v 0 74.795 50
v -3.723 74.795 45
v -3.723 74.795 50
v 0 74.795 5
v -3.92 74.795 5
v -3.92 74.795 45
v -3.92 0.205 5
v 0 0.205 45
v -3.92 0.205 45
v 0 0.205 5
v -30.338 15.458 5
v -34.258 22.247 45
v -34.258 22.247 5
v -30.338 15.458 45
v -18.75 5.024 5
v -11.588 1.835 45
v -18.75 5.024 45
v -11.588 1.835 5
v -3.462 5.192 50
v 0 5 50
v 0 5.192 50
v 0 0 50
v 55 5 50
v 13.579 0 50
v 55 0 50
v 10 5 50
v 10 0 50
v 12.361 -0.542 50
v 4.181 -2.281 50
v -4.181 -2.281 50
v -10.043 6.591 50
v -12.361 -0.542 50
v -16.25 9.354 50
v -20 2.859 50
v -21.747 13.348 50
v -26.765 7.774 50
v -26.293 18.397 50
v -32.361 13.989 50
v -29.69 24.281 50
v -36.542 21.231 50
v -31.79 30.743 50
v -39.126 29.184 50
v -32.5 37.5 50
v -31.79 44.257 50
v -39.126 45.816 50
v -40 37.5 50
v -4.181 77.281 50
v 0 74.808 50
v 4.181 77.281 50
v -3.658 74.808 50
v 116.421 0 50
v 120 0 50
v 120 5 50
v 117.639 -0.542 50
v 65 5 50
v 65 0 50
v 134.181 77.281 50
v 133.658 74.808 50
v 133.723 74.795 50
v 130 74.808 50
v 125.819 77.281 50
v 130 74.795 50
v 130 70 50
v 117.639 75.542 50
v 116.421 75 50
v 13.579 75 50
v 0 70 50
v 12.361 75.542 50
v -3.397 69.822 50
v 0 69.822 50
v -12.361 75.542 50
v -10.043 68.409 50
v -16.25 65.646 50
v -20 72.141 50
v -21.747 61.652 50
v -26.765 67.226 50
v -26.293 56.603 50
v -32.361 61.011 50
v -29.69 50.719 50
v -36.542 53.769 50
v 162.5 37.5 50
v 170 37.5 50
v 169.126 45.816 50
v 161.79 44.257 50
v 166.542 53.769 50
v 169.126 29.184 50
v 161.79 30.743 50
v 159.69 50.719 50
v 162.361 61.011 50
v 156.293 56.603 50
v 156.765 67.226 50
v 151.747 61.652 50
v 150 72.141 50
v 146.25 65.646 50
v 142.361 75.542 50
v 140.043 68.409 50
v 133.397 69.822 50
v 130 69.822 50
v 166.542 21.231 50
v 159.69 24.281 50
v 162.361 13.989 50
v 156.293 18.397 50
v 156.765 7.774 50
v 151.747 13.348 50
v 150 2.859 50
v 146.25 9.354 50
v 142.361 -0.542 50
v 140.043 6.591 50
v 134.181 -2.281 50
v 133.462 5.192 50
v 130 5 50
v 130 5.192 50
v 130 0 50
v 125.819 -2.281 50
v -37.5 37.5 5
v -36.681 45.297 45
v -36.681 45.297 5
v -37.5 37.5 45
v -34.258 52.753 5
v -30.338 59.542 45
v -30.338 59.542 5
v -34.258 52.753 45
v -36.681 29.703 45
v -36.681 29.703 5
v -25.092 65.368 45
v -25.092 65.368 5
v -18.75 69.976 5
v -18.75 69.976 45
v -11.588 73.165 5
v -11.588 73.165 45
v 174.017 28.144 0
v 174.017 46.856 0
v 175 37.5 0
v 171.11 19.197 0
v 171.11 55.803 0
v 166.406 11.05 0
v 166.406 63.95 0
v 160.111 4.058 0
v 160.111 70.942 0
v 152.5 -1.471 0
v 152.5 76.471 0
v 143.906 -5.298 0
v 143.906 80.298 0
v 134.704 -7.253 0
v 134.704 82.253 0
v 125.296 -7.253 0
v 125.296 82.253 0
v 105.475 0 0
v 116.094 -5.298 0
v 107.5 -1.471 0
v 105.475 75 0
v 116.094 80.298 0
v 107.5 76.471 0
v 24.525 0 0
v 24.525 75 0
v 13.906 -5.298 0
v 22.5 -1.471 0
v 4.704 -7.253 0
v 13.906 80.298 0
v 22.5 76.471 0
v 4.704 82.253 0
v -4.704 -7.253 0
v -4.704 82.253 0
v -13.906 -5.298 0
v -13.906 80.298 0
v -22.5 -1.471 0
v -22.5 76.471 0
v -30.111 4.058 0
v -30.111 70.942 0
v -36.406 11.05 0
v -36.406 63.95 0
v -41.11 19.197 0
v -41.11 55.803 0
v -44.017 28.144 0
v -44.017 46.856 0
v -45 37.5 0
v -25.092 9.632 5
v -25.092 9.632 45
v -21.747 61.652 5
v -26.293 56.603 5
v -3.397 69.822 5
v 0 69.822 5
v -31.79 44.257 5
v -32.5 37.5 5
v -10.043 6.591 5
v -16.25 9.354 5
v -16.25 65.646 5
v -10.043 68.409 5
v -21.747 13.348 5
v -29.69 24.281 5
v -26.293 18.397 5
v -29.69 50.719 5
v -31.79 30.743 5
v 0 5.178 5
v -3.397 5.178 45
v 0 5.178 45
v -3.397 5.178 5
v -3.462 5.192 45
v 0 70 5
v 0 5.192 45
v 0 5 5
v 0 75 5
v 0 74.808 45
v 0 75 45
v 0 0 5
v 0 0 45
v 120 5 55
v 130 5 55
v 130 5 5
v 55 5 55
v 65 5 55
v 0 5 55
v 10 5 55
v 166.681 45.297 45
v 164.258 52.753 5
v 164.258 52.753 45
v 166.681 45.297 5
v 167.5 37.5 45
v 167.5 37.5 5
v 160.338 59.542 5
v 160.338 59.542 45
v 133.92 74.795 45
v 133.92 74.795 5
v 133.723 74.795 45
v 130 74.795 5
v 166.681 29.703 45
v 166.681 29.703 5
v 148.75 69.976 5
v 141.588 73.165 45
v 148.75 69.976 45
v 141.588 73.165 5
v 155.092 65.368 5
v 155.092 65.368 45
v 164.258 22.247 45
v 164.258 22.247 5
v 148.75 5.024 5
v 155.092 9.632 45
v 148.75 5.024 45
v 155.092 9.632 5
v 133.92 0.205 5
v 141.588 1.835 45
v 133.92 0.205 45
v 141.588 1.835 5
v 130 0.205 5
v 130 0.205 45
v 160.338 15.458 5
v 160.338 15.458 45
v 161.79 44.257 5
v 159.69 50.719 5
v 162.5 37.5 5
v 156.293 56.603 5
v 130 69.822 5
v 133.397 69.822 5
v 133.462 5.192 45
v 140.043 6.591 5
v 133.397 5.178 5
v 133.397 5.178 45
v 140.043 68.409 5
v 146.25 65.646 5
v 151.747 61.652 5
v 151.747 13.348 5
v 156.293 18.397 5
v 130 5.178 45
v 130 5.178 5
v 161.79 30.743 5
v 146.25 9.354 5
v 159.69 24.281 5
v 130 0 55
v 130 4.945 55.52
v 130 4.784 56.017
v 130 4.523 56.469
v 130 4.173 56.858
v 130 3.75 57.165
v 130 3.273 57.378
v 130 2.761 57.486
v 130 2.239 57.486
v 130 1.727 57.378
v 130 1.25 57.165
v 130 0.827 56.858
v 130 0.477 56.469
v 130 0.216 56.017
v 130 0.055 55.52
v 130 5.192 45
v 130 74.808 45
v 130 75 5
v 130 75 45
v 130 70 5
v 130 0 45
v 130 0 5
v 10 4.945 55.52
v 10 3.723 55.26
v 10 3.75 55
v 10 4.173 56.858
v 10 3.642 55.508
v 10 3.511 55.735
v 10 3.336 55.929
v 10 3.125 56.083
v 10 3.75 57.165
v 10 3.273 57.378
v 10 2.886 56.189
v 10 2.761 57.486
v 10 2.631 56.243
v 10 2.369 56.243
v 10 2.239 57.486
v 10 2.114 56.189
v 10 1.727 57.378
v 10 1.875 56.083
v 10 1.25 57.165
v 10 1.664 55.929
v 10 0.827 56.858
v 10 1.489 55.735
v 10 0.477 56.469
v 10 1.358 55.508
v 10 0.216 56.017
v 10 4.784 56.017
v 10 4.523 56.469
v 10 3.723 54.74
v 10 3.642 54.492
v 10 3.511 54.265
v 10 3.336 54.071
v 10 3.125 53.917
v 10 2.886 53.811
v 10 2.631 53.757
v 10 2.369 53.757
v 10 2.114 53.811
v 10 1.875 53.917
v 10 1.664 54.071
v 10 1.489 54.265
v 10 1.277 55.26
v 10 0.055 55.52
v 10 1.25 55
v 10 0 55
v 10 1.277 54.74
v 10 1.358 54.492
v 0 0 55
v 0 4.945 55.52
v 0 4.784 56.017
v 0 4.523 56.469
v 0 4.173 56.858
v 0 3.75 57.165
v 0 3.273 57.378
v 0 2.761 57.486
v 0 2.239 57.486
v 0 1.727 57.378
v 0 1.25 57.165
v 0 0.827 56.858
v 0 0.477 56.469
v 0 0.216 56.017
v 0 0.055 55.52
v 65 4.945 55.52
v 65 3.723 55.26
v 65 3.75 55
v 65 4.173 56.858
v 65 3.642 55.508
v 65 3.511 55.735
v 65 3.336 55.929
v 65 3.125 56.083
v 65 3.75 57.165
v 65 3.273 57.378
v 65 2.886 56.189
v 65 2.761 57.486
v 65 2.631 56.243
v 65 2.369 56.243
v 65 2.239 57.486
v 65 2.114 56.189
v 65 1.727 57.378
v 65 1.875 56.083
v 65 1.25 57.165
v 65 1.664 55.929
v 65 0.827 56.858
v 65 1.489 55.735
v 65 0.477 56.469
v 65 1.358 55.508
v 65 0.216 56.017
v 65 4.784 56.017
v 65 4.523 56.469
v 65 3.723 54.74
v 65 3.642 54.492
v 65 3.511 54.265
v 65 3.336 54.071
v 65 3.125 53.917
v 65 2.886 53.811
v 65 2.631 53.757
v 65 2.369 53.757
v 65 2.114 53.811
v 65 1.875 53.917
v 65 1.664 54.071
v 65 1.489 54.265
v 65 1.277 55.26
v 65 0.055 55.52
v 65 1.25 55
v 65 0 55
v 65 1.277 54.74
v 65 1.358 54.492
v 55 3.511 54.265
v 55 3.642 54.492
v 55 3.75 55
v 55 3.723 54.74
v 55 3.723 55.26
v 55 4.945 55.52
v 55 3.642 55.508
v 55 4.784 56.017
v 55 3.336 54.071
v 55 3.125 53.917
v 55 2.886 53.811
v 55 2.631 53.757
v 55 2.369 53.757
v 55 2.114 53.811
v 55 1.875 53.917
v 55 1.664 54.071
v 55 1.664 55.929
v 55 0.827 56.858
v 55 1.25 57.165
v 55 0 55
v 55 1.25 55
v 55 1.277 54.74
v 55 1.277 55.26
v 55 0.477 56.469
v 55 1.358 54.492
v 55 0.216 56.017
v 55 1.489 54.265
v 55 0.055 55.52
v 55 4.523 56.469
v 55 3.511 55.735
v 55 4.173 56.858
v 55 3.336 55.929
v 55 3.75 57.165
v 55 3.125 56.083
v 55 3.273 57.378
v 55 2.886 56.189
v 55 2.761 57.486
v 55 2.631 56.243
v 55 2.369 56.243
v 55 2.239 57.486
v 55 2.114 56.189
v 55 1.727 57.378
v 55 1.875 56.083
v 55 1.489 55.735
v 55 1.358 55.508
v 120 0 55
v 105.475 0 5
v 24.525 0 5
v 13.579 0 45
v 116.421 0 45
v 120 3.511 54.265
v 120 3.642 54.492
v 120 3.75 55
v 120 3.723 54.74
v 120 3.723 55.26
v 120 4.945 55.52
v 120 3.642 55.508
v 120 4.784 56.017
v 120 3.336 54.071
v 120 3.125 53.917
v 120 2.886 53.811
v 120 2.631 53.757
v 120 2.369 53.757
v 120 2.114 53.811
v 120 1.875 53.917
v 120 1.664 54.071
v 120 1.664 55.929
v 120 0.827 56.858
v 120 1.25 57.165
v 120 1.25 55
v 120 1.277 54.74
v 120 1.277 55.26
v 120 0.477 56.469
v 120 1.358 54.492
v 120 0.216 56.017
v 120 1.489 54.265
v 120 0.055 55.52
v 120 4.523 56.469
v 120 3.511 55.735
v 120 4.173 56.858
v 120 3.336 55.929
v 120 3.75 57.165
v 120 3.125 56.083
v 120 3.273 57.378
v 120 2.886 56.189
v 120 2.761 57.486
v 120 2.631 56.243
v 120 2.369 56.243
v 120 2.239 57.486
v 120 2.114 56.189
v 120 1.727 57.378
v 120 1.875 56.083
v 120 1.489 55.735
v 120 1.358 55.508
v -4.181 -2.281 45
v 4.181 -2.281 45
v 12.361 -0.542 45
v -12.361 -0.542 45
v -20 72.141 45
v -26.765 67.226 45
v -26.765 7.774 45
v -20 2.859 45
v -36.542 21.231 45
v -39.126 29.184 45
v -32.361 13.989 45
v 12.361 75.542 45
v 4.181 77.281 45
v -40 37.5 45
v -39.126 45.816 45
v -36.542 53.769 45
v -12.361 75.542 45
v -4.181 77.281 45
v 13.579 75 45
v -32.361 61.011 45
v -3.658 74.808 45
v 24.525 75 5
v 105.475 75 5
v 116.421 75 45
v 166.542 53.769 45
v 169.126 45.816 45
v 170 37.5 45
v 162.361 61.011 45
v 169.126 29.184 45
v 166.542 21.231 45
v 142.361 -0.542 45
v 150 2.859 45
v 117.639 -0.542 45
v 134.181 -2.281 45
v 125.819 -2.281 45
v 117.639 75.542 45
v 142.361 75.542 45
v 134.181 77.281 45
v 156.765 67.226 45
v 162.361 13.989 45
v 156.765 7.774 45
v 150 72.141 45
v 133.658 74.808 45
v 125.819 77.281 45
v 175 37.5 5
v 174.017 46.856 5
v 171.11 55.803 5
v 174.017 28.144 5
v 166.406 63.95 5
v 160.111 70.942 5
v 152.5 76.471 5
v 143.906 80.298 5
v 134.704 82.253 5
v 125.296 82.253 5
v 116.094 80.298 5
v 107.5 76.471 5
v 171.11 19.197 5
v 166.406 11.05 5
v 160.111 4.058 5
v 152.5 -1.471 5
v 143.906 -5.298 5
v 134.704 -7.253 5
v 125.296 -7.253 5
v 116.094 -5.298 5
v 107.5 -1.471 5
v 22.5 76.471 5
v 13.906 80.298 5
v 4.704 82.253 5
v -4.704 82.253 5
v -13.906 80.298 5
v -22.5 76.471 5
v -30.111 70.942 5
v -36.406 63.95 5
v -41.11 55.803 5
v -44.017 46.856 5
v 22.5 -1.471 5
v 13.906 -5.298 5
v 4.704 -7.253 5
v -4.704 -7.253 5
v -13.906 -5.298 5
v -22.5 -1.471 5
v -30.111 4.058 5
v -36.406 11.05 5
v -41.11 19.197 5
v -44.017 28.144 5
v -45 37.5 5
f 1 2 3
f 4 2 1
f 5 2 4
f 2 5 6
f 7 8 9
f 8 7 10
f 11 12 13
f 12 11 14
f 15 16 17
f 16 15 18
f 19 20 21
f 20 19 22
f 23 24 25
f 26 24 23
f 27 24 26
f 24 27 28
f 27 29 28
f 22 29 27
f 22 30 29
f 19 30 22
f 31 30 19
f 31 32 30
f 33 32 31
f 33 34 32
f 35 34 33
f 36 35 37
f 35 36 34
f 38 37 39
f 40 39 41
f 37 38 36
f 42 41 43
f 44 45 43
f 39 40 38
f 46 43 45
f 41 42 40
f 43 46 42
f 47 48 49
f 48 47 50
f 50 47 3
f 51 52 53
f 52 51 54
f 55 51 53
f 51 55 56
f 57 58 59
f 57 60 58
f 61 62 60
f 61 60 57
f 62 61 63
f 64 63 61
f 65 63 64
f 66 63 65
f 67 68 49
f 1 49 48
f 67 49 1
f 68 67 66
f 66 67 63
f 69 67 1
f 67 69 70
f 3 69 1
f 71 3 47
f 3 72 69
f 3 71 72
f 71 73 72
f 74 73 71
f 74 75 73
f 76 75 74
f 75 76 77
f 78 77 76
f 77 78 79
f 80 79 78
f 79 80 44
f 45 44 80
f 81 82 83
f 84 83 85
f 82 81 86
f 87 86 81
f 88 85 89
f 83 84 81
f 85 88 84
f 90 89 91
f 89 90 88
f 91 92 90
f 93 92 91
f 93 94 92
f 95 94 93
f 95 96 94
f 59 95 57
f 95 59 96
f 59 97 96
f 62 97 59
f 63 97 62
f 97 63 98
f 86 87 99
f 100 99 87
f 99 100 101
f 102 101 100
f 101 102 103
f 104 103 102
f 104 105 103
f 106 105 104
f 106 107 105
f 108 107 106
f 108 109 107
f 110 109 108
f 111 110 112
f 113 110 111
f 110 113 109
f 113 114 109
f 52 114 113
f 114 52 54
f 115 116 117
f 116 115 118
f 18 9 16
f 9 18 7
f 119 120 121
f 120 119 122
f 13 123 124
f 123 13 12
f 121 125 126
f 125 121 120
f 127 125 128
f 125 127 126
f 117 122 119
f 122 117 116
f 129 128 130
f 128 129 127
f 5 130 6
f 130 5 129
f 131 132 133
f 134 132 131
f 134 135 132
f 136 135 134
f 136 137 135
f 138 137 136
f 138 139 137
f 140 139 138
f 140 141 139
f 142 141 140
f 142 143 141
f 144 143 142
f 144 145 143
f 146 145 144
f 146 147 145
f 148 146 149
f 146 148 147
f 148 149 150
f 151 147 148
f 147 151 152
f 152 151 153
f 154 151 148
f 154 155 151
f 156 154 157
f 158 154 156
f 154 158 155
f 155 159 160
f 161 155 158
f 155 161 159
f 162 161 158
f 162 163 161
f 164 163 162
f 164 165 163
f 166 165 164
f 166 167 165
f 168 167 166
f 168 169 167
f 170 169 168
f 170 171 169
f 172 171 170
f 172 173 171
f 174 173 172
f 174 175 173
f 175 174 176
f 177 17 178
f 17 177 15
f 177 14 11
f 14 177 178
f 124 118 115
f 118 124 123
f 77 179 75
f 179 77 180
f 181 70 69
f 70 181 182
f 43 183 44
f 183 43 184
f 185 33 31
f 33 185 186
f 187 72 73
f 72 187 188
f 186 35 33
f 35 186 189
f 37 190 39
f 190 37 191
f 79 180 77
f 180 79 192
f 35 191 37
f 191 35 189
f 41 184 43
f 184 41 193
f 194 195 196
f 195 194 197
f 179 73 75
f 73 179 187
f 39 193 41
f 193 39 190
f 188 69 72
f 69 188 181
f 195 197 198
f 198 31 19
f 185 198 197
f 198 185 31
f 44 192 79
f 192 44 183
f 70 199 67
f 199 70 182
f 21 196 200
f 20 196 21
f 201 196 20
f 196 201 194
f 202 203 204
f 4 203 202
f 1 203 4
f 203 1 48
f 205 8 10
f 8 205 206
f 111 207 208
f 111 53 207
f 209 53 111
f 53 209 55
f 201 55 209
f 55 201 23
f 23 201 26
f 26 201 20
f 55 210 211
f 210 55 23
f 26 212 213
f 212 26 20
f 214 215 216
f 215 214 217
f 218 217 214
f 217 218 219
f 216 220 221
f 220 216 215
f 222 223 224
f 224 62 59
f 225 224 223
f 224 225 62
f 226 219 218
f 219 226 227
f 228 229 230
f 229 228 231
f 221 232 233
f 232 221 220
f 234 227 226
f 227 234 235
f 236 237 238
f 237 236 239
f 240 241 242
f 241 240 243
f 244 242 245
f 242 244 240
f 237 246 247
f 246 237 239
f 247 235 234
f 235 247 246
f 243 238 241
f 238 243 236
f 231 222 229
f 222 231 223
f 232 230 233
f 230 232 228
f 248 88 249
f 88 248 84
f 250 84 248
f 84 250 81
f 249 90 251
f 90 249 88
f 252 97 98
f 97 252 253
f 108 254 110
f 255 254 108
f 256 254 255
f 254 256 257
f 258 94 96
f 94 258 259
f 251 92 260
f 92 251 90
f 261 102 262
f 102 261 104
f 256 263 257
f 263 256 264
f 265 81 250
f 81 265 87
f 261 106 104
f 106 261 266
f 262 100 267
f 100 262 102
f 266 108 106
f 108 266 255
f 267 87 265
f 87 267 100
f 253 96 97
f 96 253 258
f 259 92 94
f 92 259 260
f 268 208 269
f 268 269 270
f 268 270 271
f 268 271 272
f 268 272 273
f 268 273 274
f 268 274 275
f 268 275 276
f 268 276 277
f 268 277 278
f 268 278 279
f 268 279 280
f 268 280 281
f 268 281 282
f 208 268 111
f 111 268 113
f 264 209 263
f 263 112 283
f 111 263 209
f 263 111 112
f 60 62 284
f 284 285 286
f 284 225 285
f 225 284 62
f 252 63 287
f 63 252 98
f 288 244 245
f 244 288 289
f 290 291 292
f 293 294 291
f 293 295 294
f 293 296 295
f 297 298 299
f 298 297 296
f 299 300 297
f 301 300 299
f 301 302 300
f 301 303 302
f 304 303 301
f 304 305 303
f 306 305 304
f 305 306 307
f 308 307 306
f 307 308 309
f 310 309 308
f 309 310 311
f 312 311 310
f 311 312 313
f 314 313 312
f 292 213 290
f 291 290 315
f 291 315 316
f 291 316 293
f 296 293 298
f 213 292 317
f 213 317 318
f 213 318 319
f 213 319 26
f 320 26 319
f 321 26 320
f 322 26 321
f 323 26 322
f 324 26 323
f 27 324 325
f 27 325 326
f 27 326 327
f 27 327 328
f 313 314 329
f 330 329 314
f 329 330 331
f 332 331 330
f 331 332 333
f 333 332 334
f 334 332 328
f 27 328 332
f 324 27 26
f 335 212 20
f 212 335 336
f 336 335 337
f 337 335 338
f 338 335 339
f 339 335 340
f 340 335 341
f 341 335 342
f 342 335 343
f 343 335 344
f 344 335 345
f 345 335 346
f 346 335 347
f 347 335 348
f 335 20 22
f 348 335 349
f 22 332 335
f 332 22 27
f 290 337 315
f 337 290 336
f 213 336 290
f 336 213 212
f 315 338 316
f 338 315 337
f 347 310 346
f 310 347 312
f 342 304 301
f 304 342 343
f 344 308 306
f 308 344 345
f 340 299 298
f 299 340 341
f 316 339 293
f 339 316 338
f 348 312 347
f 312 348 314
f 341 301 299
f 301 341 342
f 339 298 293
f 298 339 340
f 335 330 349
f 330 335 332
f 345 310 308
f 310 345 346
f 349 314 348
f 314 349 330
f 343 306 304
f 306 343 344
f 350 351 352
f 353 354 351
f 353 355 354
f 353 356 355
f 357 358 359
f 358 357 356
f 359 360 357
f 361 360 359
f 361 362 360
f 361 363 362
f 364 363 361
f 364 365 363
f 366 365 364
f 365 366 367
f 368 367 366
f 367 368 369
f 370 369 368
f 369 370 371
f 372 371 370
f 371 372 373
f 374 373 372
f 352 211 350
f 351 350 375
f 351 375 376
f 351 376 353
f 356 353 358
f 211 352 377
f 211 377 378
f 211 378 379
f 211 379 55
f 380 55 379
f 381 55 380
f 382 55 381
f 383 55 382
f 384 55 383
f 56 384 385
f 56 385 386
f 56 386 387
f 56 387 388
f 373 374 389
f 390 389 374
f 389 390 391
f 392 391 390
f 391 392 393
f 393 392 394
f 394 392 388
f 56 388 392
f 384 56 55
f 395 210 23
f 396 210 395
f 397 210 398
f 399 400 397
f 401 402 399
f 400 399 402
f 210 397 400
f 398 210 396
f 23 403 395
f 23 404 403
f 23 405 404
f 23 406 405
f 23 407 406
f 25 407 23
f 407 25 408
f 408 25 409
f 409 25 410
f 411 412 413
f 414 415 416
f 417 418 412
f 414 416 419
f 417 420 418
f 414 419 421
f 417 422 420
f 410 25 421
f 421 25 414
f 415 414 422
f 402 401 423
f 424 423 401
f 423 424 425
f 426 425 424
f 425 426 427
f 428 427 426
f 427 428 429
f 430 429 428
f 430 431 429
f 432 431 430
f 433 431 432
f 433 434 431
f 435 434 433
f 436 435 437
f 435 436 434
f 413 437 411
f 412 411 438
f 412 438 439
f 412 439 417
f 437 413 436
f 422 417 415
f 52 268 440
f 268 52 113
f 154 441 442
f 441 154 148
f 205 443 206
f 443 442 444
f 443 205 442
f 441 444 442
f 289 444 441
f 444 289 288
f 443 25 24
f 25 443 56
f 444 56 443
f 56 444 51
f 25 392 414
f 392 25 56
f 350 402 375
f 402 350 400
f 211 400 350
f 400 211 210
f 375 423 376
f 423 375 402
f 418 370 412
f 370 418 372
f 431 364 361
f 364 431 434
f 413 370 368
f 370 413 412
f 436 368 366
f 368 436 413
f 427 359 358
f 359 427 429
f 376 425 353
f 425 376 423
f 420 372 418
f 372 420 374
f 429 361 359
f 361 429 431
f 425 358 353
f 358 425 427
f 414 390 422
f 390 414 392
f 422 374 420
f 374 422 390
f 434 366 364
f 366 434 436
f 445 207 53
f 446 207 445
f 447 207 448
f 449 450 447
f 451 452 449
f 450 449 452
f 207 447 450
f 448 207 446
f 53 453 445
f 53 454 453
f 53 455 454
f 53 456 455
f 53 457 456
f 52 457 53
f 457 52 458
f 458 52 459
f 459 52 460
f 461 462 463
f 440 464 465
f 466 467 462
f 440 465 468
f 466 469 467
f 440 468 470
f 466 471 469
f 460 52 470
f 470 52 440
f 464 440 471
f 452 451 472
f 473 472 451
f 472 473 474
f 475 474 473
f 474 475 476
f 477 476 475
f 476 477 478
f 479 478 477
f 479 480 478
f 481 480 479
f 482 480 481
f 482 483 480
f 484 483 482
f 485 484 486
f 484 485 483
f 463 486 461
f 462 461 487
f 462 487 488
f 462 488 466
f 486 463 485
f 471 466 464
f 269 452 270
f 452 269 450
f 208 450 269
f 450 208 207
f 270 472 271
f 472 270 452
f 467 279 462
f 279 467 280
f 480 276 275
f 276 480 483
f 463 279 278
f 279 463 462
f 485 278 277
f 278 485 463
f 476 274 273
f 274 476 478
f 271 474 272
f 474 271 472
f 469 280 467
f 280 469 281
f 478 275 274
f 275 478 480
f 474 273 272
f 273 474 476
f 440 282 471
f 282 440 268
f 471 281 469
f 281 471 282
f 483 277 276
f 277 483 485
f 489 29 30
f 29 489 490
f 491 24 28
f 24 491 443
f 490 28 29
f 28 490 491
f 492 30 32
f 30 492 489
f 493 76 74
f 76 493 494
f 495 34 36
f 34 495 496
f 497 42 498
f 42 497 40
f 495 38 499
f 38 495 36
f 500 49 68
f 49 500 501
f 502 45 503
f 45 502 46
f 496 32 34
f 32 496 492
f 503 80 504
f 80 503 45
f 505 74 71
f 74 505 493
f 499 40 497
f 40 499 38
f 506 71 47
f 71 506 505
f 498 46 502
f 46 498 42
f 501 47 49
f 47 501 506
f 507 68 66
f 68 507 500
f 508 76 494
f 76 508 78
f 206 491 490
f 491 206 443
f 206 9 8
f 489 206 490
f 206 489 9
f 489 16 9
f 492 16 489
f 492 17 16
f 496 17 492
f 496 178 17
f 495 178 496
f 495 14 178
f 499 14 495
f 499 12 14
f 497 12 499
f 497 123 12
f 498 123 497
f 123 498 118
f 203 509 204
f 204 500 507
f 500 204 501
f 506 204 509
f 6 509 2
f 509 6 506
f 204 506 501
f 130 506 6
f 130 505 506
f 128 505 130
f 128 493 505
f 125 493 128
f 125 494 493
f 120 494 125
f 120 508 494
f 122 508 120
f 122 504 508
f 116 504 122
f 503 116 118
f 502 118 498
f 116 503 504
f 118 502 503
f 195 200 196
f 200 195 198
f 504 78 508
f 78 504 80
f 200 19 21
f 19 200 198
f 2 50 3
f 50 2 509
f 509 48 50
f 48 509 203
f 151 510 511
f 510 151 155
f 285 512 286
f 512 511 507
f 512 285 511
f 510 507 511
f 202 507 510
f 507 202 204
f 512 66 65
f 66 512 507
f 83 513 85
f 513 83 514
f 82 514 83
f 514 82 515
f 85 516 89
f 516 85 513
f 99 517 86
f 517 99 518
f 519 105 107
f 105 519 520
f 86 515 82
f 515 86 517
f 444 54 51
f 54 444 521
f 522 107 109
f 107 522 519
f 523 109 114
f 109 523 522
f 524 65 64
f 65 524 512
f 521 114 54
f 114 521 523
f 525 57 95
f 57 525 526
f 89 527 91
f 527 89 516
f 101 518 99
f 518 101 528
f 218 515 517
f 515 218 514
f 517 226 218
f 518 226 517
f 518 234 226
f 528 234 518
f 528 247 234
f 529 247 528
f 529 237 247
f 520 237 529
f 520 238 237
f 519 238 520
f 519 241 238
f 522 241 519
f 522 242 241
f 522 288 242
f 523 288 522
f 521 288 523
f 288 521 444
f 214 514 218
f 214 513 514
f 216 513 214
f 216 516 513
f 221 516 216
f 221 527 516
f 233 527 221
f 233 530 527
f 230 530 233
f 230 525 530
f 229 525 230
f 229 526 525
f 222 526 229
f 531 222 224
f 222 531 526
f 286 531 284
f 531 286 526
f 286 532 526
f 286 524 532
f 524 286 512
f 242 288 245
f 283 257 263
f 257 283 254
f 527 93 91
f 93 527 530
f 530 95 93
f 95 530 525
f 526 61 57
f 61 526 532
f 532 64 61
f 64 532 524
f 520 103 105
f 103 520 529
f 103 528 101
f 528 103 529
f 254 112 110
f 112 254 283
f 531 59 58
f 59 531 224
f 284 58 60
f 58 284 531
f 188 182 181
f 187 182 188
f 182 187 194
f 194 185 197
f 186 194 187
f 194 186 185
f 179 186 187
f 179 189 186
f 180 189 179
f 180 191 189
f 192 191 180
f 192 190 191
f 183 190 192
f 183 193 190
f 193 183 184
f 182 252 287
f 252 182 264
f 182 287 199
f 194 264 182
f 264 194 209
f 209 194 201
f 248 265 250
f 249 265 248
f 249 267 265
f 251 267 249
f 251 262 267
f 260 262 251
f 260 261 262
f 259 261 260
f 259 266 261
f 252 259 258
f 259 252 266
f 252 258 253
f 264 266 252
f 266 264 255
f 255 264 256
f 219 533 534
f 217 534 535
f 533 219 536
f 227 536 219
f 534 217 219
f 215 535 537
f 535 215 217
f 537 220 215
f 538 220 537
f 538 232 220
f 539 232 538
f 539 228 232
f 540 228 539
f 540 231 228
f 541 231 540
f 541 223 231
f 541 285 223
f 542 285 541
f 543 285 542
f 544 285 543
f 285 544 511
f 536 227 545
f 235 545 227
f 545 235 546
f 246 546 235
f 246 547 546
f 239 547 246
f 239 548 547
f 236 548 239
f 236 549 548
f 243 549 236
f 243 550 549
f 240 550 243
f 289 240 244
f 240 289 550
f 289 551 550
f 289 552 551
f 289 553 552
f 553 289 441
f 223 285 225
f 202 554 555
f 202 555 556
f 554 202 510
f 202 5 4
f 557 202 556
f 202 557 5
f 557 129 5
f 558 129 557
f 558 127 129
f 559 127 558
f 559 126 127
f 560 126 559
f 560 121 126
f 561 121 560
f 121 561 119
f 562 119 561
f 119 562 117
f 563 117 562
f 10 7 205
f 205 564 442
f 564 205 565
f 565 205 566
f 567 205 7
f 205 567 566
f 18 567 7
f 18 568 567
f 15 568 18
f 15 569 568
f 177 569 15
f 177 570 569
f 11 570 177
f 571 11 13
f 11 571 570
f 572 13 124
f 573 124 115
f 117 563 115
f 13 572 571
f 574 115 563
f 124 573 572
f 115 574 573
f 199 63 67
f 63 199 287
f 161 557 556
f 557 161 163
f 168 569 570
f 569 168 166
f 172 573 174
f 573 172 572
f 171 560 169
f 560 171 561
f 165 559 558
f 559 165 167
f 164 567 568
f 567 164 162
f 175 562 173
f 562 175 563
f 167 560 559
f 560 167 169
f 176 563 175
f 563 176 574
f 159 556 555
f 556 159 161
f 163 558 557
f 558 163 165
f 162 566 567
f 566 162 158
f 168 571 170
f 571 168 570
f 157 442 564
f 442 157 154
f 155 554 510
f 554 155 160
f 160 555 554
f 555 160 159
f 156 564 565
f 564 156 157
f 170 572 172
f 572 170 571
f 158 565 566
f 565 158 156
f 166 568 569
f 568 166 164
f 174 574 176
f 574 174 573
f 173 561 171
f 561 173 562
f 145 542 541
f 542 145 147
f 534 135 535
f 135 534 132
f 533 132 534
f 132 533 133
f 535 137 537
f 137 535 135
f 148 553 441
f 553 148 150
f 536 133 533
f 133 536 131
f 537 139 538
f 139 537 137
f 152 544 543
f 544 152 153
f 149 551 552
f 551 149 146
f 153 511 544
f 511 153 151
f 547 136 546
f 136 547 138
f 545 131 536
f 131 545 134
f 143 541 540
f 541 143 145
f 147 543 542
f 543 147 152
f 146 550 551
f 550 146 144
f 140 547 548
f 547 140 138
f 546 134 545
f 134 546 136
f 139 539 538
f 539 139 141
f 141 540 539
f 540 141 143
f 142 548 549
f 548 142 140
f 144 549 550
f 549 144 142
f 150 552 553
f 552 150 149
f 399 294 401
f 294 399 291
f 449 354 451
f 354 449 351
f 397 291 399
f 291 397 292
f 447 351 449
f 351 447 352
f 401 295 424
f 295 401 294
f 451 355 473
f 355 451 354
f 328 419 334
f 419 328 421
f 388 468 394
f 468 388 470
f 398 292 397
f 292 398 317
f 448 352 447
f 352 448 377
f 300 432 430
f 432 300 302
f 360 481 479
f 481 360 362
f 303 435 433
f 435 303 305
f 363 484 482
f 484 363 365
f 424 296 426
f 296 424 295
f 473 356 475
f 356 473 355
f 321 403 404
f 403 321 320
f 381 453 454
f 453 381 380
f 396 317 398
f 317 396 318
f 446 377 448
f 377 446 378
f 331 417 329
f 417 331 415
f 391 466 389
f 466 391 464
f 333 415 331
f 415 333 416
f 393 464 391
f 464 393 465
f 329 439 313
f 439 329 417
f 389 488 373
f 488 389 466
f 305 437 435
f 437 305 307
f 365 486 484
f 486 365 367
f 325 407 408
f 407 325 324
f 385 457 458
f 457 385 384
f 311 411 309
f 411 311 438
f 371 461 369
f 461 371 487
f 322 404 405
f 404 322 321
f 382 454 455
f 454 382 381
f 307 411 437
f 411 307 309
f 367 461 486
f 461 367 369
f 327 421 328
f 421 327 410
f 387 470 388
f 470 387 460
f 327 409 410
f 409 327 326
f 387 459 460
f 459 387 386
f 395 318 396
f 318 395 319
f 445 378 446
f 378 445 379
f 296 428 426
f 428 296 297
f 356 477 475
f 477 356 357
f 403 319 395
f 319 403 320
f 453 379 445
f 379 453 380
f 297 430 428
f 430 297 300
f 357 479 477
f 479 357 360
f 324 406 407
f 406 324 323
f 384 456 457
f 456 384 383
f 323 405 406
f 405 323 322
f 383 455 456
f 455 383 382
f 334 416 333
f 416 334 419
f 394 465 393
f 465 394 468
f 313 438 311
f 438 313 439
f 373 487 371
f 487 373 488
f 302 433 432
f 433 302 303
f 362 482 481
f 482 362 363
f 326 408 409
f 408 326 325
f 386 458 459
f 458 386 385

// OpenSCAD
$fn=30;

hcoffre= 50;
lcoffrex= 130;
llamey= 5;
lcoffrey=70;



module base(){


cube([lcoffrex,lcoffrey,llamey]) ;

translate([0,lcoffrey/2+5,0])cylinder(h=llamey,r=lcoffrey/2+5) ;

translate([lcoffrex,lcoffrey/2+5,0])cylinder(h=llamey,r=lcoffrey/2+5) ;



cube([lcoffrex,llamey,hcoffre]) ;

translate([0,lcoffrey,0])cube([lcoffrex,llamey,hcoffre]) ;



difference(){translate([0,lcoffrey/2+llamey/2,0])cylinder(h=hcoffre,r=lcoffrey/2+llamey/2);
translate([0,lcoffrey/2+llamey/2,0])cylinder(h=hcoffre,r=lcoffrey/2-llamey/2) ;translate([0,llamey,0])cube([lcoffrex/2,lcoffrey,hcoffre]); }

difference(){translate([lcoffrex,lcoffrey/2+llamey/2,0])cylinder(h=hcoffre,r=lcoffrey/2+llamey/2) ;
translate([lcoffrex,lcoffrey/2+llamey/2,0])cylinder(h=hcoffre,r=lcoffrey/2-llamey/2) ;translate([lcoffrex/2,llamey,0])cube([lcoffrex/2,lcoffrey,hcoffre]); }


union() {translate([0,0,hcoffre])cube([10,llamey,5]) ;

rotate([90,0,90])translate([llamey/2,hcoffre+5,0])cylinder(h=10,r=llamey/2) ;}


translate([lcoffrex/2-10,0,0])union() {translate([0,0,hcoffre])cube([10,llamey,5]) ;

rotate([90,0,90])translate([llamey/2,hcoffre+5,0])cylinder(h=10,r=llamey/2) ;}


translate([lcoffrex-10,0,0])union() {translate([0,0,hcoffre])cube([10,llamey,5]) ;

rotate([90,0,90])translate([llamey/2,hcoffre+5,0])cylinder(h=10,r=llamey/2) ;}


translate([0,lcoffrey/2+llamey/2,0])cylinder(h=llamey,r=lcoffrey/2+10);

translate([lcoffrex,lcoffrey/2+llamey/2,0])cylinder(h=llamey,r=lcoffrey/2+10);

difference(){translate([0,lcoffrey/2+llamey/2,hcoffre-llamey])cylinder(h=llamey,r=lcoffrey/2+llamey);
translate([0,lcoffrey/2+5,hcoffre-10])cylinder(h=hcoffre,r=lcoffrey/2) ;translate([0,llamey,hcoffre-10])cube([lcoffrex/2,lcoffrey,hcoffre]); }

difference(){translate([lcoffrex,lcoffrey/2+llamey/2,hcoffre-llamey])cylinder(h=llamey,r=lcoffrey/2+llamey);
translate([lcoffrex,lcoffrey/2+5,hcoffre-10])cylinder(h=hcoffre,r=lcoffrey/2) ;translate([lcoffrex/2,llamey,hcoffre-10])cube([lcoffrex/2,lcoffrey,hcoffre]); }


}
base();

module llave(){
translate([0,llamey/2,hcoffre+5])rotate([90,0,90])cylinder(h=lcoffrex,r=llamey/4);
}
llave();
